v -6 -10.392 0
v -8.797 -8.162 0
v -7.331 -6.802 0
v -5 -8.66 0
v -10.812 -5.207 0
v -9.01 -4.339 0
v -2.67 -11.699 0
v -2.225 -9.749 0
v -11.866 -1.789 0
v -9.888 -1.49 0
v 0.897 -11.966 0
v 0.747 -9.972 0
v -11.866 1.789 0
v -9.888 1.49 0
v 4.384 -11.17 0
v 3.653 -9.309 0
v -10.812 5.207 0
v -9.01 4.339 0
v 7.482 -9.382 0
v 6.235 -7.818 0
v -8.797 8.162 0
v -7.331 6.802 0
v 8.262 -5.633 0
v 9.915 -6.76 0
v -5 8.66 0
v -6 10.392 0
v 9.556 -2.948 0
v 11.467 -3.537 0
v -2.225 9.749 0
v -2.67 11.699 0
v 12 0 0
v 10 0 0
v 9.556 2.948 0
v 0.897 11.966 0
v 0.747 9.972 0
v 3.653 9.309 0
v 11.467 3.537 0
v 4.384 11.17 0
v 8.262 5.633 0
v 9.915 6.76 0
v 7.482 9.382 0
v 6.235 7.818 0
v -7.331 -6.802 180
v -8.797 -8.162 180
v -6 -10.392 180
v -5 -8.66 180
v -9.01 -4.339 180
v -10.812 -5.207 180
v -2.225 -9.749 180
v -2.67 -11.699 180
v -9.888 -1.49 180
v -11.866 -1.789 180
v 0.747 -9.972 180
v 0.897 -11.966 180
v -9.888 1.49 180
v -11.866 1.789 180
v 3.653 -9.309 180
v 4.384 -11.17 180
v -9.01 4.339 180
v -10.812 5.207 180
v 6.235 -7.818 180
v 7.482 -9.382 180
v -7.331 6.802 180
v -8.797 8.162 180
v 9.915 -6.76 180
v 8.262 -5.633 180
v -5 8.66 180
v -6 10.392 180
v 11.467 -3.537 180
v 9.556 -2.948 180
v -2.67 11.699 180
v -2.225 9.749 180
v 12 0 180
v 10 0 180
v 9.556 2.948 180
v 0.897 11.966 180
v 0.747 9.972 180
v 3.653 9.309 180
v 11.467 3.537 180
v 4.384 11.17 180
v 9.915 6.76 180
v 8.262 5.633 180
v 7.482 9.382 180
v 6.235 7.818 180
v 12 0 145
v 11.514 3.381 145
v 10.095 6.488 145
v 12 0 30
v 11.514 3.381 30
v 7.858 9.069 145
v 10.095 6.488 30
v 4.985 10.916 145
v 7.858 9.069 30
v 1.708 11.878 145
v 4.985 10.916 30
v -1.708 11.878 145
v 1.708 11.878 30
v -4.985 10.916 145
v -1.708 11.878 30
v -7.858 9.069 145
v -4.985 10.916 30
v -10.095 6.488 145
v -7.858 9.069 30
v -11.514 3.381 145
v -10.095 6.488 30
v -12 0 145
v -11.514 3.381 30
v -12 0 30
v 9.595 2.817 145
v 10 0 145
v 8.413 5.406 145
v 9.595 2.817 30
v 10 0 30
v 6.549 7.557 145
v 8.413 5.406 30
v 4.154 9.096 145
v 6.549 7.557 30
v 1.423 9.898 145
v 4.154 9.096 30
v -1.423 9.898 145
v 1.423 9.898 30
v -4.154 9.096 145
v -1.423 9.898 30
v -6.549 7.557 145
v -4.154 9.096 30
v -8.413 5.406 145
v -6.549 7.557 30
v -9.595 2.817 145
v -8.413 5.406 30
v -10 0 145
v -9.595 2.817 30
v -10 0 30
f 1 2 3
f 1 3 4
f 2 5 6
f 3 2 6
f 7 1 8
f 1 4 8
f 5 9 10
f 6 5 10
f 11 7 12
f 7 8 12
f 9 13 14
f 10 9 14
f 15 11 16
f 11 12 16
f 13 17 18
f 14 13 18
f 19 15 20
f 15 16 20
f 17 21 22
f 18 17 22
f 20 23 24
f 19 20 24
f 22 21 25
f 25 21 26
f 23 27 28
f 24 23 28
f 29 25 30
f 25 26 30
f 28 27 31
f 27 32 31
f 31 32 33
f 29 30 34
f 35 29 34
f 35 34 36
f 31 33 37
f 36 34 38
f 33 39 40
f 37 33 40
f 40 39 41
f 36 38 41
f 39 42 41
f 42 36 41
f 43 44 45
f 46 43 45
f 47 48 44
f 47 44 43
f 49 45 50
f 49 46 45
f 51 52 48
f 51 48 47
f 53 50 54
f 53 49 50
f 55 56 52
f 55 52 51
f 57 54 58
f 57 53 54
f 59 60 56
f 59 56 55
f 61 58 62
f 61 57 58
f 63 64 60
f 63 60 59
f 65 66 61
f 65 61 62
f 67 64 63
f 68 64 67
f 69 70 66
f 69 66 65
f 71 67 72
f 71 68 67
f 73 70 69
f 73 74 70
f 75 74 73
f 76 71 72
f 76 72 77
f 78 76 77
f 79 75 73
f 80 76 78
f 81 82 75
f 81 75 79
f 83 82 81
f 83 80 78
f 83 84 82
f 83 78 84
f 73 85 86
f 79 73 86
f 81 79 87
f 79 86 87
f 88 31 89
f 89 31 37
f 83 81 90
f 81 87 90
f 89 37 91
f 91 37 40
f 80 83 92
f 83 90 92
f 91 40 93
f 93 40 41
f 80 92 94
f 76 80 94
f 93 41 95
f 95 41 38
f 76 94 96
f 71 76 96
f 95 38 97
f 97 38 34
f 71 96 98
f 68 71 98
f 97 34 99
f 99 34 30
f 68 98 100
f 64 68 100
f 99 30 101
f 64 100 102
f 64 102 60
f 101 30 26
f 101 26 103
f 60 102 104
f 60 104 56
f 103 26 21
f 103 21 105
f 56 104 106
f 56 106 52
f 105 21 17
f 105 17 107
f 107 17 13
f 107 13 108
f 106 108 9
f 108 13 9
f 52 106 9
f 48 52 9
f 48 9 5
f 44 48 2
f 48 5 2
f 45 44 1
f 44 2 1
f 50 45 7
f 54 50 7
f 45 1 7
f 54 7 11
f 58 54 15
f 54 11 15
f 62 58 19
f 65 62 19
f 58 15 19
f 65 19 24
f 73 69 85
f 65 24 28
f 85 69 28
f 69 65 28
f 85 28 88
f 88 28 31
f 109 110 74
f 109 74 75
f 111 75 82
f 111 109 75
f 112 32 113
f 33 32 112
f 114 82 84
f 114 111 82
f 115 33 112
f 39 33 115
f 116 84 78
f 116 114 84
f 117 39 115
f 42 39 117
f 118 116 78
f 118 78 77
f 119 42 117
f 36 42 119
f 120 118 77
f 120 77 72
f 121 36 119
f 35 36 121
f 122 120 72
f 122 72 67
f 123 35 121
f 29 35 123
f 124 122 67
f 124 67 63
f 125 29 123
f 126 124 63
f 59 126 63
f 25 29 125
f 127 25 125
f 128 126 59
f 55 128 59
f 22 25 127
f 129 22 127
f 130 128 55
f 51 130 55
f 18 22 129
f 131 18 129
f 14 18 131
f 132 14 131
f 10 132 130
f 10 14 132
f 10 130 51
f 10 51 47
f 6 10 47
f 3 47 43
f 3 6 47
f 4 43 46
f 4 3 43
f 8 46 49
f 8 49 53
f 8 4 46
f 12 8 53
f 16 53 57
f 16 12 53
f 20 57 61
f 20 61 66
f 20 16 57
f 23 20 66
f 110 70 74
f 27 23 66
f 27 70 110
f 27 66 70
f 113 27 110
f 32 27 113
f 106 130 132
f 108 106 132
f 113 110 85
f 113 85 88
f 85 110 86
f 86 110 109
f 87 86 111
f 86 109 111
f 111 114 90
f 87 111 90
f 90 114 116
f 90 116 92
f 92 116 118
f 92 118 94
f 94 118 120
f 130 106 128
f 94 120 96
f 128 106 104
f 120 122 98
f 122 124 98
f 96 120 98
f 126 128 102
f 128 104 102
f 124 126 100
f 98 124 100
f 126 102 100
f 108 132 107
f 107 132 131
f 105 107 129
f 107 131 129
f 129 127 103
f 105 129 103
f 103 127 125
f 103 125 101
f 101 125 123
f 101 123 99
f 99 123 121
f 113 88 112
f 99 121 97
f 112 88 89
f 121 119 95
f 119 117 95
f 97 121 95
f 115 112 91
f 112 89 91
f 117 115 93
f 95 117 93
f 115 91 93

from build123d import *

# Parameters (mm, degrees)
SCHIZZO1_R                    = 12
SCHIZZO1_R_2                  = 10
ESTRUSIONE_ESTRUSIONE1_DEPTH  = 180
TAGLIO_ESTRUSIONE1_DEPTH      = 20
TAGLIO_ESTRUSIONE1_DEPTH_BACK = 20
SCHIZZO2_W                    = 115
SCHIZZO2_H                    = 12


with BuildPart() as part:
    # Schizzo1 → Estrusione-Estrusione1 (new body)
    with BuildSketch(Plane.XY):
        Circle(SCHIZZO1_R)
        Circle(SCHIZZO1_R_2, mode=Mode.SUBTRACT)
    extrude(amount=ESTRUSIONE_ESTRUSIONE1_DEPTH)

    # Schizzo2 → Taglio-Estrusione1 (cut, two sides: drawn at the far end of the back side and taken through both)
    with BuildSketch(Plane(origin=(0, 0, 0), x_dir=(0, 0, -1), z_dir=(1, 0, 0)).offset(-TAGLIO_ESTRUSIONE1_DEPTH_BACK)):
        with Locations((-87.5, 6)):
            Rectangle(SCHIZZO2_W, SCHIZZO2_H)
    extrude(amount=TAGLIO_ESTRUSIONE1_DEPTH + TAGLIO_ESTRUSIONE1_DEPTH_BACK, mode=Mode.SUBTRACT)


solid = part.part
